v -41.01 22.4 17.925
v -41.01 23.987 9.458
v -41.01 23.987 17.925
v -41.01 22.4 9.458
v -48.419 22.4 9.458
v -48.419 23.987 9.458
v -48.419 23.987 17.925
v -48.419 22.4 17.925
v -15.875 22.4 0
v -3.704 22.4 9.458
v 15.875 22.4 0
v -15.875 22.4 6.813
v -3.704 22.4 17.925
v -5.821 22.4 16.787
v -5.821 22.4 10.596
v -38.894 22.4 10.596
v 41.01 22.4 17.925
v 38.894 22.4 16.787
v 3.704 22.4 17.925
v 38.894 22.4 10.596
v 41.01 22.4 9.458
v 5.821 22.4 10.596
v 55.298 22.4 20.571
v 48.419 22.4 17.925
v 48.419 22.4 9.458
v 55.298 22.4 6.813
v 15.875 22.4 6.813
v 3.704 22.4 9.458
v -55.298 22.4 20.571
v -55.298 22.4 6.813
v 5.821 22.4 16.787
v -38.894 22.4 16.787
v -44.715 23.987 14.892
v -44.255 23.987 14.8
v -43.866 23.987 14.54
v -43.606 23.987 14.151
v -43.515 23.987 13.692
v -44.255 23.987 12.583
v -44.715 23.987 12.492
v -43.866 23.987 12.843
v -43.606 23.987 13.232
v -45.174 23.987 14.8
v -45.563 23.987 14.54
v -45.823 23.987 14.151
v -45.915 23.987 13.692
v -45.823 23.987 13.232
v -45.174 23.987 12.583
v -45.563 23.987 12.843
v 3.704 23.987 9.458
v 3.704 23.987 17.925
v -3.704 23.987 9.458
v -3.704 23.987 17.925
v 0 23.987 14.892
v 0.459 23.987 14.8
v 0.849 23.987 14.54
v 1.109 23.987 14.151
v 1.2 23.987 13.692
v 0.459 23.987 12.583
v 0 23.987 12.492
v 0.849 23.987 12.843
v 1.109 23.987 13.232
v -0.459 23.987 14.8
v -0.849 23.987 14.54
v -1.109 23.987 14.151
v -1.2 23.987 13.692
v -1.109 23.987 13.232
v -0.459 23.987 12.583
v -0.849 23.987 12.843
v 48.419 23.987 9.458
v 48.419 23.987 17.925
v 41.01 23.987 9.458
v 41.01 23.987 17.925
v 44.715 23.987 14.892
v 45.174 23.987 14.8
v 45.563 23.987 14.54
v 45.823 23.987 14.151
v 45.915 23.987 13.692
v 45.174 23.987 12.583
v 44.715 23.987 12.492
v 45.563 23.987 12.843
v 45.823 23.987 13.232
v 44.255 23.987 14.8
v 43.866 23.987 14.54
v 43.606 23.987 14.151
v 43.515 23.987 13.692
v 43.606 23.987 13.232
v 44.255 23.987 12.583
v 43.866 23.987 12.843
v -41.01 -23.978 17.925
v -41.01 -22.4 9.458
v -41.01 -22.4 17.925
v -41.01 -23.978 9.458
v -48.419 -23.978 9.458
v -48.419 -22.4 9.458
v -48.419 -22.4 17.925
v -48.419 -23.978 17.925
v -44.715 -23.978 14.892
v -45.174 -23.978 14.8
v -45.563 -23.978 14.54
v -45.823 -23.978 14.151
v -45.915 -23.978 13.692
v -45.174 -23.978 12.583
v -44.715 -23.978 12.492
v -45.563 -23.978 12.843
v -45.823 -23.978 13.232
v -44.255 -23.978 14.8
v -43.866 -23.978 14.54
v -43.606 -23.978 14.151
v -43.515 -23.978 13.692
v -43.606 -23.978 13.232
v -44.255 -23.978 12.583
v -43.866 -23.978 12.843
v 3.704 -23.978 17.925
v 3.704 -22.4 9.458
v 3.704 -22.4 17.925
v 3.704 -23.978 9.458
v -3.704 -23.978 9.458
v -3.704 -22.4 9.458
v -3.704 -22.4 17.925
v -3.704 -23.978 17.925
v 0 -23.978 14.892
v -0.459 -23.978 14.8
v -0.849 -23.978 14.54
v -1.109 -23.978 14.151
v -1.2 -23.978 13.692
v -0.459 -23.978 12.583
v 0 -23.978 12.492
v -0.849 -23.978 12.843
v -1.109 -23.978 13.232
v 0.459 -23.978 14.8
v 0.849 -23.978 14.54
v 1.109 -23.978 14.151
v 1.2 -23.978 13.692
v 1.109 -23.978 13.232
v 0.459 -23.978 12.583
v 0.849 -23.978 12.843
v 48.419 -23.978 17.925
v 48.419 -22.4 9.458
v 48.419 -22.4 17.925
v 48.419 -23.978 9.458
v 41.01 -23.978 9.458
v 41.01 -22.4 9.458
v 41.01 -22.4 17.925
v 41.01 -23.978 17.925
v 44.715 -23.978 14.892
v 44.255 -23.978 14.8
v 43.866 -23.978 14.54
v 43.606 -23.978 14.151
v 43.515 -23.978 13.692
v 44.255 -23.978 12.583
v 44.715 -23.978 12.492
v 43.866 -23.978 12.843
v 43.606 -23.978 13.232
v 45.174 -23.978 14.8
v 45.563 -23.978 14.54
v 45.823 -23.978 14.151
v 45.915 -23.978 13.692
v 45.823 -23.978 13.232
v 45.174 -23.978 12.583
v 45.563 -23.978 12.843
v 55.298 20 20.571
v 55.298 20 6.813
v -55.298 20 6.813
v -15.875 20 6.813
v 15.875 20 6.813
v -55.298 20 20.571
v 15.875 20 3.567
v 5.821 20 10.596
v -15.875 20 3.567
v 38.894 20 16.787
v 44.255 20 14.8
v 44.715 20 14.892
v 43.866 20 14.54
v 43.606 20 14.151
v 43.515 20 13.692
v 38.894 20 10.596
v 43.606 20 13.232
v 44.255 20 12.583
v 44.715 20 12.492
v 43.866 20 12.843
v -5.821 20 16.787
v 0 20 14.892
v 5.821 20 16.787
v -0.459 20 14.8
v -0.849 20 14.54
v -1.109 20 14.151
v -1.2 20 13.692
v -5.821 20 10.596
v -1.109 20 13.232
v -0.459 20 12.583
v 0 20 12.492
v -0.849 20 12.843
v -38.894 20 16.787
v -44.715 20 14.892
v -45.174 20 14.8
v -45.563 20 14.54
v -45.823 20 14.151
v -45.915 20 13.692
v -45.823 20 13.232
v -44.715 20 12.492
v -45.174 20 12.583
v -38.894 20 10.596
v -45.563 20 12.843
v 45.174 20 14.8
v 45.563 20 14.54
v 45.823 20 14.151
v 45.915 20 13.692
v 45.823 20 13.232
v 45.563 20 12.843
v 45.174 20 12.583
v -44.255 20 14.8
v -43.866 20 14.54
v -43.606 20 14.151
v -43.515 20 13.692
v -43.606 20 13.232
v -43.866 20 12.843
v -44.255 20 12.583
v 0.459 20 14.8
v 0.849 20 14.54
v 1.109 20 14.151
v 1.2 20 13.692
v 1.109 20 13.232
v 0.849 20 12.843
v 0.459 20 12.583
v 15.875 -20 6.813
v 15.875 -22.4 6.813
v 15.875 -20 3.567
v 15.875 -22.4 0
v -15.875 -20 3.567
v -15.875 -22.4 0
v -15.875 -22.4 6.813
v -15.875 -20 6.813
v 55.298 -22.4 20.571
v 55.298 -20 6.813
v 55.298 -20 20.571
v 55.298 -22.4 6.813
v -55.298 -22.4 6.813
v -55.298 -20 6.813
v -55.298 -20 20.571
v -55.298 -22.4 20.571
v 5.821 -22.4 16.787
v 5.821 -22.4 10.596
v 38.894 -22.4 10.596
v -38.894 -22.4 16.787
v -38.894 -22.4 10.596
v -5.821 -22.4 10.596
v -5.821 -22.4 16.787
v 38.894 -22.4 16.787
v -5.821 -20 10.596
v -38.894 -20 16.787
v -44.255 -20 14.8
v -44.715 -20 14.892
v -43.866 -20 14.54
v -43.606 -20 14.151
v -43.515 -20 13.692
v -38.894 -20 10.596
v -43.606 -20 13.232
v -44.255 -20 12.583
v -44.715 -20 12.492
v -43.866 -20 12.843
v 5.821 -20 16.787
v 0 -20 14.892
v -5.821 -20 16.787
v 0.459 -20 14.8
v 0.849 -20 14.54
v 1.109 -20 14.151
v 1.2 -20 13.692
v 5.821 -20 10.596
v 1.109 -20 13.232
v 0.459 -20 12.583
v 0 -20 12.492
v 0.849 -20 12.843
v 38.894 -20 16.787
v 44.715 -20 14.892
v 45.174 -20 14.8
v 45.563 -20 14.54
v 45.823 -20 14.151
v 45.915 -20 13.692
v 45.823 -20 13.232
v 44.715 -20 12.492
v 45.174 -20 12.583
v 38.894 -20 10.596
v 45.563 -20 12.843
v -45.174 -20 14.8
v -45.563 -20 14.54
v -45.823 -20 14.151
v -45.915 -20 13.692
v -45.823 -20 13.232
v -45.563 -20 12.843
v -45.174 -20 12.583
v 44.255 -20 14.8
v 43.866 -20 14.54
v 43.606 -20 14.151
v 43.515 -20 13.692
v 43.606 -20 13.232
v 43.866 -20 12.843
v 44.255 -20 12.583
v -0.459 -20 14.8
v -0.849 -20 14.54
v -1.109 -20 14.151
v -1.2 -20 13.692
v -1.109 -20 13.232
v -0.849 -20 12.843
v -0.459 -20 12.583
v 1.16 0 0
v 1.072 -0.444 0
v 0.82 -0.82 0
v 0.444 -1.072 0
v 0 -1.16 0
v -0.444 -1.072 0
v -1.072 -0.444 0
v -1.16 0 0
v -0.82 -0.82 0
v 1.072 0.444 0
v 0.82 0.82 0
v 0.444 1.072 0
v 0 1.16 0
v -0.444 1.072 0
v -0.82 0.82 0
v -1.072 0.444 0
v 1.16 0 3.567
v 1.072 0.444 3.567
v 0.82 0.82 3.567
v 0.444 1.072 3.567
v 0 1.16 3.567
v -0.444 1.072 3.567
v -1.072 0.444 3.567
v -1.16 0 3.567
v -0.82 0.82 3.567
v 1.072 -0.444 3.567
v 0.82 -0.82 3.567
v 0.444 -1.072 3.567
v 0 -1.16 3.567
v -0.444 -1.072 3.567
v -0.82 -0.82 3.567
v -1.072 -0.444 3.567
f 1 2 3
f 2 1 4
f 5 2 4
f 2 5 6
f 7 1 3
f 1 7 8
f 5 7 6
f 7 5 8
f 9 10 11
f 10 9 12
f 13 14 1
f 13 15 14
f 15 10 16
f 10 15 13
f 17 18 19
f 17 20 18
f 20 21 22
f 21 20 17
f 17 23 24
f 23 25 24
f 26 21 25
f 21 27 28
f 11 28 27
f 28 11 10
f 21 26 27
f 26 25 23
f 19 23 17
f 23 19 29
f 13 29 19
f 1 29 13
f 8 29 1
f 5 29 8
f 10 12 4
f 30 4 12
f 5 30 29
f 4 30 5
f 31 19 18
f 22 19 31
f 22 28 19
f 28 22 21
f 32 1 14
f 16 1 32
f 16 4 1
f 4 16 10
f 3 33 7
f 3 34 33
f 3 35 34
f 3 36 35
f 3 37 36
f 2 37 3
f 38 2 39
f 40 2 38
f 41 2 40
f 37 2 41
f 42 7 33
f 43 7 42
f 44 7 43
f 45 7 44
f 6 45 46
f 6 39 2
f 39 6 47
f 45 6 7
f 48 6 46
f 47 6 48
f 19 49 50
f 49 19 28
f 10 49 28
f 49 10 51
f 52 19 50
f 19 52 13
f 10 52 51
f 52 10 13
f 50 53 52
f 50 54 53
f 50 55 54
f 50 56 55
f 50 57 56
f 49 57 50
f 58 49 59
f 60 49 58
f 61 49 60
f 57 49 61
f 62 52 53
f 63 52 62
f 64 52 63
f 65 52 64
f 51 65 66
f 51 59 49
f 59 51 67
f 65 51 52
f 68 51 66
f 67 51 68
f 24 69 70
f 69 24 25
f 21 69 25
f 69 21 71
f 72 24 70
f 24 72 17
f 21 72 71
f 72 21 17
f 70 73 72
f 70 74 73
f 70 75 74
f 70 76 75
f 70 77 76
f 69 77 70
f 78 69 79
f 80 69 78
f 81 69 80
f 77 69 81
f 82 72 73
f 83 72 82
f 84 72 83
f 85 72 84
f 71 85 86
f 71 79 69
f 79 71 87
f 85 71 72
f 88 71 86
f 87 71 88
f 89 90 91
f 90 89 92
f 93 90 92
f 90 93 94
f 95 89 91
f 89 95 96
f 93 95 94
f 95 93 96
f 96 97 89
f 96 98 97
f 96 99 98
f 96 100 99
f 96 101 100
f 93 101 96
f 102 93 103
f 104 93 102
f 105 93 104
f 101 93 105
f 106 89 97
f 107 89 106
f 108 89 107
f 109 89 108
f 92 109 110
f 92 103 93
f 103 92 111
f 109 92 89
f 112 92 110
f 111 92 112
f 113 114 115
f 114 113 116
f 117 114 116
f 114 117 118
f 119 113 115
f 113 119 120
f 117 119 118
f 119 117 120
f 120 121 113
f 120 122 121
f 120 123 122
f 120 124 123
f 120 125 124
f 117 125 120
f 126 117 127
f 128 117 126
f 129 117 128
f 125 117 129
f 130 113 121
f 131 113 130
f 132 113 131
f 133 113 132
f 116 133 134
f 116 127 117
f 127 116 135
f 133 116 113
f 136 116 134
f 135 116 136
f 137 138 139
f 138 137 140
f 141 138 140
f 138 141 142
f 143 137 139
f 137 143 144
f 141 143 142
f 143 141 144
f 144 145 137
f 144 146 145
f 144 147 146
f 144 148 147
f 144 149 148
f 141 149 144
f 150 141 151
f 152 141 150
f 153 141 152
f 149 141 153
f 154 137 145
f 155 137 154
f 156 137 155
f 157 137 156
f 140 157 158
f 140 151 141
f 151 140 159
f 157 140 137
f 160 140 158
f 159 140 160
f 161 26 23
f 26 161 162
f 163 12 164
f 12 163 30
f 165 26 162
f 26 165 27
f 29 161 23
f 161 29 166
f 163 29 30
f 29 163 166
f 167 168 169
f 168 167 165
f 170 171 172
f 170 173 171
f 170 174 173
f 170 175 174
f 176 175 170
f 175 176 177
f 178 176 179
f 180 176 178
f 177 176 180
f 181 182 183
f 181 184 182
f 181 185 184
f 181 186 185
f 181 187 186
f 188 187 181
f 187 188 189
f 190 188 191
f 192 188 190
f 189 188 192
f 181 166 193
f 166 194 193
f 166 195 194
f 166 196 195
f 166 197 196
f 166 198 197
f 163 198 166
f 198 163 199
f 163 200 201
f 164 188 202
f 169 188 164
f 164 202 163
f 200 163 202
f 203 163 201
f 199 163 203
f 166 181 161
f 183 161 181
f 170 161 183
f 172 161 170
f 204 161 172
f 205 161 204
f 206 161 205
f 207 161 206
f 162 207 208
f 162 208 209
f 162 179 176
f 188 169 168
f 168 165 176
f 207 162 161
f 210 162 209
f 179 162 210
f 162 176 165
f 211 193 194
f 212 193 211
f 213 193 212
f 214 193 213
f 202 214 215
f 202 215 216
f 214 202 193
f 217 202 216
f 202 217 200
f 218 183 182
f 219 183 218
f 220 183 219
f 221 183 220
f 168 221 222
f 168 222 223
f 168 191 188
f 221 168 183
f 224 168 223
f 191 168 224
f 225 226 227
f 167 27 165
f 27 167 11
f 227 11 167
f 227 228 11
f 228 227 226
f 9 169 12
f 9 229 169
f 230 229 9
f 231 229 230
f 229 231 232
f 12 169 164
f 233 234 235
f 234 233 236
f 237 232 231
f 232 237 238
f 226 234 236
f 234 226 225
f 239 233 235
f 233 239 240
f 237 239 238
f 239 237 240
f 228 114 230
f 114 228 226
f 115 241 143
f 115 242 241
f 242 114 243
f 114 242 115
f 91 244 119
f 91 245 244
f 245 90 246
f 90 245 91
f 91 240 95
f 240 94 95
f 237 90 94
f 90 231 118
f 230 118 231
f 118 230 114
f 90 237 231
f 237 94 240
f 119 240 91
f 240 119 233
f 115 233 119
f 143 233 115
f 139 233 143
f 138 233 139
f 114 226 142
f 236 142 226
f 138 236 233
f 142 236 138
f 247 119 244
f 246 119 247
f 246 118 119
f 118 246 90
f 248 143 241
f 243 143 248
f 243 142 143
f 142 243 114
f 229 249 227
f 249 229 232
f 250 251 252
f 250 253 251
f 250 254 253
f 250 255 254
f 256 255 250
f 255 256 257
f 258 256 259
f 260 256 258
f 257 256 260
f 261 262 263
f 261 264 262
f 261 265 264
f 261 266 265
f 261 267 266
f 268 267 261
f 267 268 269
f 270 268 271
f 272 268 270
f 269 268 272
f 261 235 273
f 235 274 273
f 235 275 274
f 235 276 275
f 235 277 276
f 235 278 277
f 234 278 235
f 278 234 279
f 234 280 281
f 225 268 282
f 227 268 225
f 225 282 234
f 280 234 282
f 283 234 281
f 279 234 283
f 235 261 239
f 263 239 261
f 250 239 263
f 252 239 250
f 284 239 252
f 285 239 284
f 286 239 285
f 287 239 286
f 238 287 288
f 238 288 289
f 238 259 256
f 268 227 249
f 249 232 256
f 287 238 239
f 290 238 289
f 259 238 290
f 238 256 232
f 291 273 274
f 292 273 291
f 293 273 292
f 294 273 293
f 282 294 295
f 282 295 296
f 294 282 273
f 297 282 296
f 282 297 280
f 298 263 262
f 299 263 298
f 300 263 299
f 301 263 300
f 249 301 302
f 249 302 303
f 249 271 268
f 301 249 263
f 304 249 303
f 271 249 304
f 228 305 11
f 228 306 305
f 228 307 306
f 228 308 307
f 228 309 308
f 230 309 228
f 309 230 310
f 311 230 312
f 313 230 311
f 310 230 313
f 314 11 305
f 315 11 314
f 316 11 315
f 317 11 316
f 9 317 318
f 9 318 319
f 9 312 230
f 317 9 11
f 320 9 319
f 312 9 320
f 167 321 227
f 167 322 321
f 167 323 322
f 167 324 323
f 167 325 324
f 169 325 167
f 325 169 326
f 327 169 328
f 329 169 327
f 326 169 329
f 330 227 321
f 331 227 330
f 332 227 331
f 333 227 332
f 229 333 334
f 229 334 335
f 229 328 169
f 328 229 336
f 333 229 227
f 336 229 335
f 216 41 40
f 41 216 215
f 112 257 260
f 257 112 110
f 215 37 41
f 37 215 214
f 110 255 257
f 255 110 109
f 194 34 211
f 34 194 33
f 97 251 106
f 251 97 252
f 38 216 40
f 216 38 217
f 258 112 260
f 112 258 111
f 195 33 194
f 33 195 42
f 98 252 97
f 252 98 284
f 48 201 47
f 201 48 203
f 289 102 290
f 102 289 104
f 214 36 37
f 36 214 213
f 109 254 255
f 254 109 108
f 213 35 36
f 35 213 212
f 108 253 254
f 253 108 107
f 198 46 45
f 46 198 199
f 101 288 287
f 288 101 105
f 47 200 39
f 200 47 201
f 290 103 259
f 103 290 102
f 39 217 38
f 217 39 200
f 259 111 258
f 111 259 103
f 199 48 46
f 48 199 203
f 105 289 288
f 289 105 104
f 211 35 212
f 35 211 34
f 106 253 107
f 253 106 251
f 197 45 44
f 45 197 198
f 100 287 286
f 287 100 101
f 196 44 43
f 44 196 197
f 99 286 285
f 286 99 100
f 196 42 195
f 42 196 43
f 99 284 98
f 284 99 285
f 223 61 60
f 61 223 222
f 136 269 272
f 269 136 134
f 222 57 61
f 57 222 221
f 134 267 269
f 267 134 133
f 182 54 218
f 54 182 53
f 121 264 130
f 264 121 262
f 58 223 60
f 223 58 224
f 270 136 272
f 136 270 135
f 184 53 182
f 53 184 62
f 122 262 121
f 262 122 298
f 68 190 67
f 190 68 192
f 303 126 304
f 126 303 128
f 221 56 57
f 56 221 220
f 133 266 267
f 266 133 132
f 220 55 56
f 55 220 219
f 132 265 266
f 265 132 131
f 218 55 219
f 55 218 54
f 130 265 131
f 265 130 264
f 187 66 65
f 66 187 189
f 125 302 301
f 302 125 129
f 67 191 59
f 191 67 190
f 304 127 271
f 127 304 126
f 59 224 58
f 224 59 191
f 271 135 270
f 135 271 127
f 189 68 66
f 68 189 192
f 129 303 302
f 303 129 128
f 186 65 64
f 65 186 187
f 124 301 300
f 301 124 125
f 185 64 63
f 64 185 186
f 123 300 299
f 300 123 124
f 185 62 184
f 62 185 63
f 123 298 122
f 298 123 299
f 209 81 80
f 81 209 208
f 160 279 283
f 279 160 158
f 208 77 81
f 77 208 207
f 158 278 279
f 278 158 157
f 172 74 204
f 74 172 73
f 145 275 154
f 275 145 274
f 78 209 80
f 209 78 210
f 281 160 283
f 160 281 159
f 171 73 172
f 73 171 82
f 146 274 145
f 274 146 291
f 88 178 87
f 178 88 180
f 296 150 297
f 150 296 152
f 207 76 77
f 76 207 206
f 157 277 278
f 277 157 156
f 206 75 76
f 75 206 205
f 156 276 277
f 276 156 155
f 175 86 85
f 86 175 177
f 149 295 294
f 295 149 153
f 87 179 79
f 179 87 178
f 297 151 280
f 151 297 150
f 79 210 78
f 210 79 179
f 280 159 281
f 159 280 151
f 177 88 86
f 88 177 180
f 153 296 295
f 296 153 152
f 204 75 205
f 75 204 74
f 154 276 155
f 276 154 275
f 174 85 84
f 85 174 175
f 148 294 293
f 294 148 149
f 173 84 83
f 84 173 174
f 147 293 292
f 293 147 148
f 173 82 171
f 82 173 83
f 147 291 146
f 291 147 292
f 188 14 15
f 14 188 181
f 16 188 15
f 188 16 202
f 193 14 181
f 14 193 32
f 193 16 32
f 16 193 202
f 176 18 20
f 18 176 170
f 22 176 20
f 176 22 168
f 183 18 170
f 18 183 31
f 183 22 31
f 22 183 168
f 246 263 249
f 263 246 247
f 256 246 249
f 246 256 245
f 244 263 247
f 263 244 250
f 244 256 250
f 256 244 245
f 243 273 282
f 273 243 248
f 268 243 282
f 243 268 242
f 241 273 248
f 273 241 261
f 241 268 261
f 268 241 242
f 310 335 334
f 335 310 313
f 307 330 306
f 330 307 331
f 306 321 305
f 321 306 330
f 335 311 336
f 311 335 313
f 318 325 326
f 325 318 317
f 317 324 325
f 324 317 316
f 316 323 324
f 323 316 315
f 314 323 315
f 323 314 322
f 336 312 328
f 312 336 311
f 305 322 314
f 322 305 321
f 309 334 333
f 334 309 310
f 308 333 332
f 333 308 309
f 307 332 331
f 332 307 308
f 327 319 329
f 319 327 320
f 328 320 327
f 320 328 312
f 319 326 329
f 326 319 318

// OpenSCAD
// file: ../../library/e7_all.scad
// ==========================================================================
//  e7_all.scad - include this one file. Preview, print plates and the report.
// ==========================================================================
include <e7_params.scad>
include <e7_body.scad>

// whole painted loco
module e7_preview() {
  // carbody in its paint bands
  for (i = [0:len(PAINT_BANDS) - 1]) {
    z0 = i == 0 ? -1 : p(PAINT_BANDS[i - 1][0]);
    z1 = i == len(PAINT_BANDS) - 1 ? 1000 : p(PAINT_BANDS[i][0]);
    color(PAINT_BANDS[i][1]) render(convexity = 8) e7_shell_solid([z0, z1]);
  }
  color(C_GLASS) e7_glass();
  color(C_LENS) let (d = nose_d_at_z(HEADLIGHT[0]))
    translate([XF - p(d) + p(HEADLIGHT[2]) + p(1.5), 0, p(HEADLIGHT[0])]) rotate([0, 90, 0]) cylinder(d = p(HEADLIGHT[1]) - 0.8, h = 0.5, $fn = 32);
  color(C_FRAME) { for (j = [1:NFRAME]) e7_frame_piece(j); e7_pilot(); e7_pilot_rear(); }
  for (tx = [TRK_X, -TRK_X]) translate([tx, 0, 0]) { color(C_TRUCK) e7_truck_frame(); color(C_WHEEL) e7_wheels(); }
}
// thin glass panes sitting in the window pockets (preview only)
module e7_glass() {
  intersection() { e7_loft(DET * 0.6); union() { e7_windshield_cut(); e7_side_cuts_windows_only(); } }
}
module e7_side_cuts_windows_only() {
  for (s = [-1, 1], w = CAB_WIN)
    translate([XF - p(w[1]), s * HW - (s > 0 ? DET : 3 - DET), p(w[2])]) cube([p(w[1] - w[0]), 3, p(w[3] - w[2])]);
}

// one print, laid out for the printer
module e7_plate(part) {
  sec = [for (k = [1:NSEC]) str("body_", k)];
  frm = [for (j = [1:NFRAME]) str("frame_", j)];
  if (is_num(search([part], sec)[0])) {
    k = search([part], sec)[0] + 1;
    // stand the section on its open bottom (skirt edge on the bed)
    translate([-sec_x0(k) - SEC_L / 2, 0, -Z_SKIRT]) e7_body_section(k);
  } else if (is_num(search([part], frm)[0])) {
    j = search([part], frm)[0] + 1;
    xs = concat([FRAME_X0], FRAME_SPLITS, [FRAME_X1]);
    translate([-(xs[j - 1] + xs[j]) / 2, 0, -Z_FRAME_BOT]) e7_frame_piece(j);
  } else if (part == "pilot") {
    translate([-XF, 0, 0]) rotate([0, 0, 0]) translate([0, 0, -p(5)]) e7_pilot();
  } else if (part == "pilot_rear") {
    translate([-XR, 0, 0]) translate([0, 0, -(CPL_Z - CPL_H / 2 - WALL)]) e7_pilot_rear();
  } else if (part == "truck") {
    // upside down, bolster on the bed
    translate([0, 0, Z_FRAME_BOT - 0.3]) rotate([180, 0, 0]) e7_truck_frame();
  } else {
    assert(false, str("unknown part '", part, "'"));
  }
}

module e7_report() {
  echo(str("MILW E7A ", ROAD_NO, " class ", CLASS, " - ", SC, " scale 1:", RATIO, ", paint ", PAINT));
  echo(str("  carbody ", round(BL), " mm long, ", round(2 * HW), " mm wide, roof ", round(Z_ROOF), " mm, cab ", round(Z_CAB), " mm above rail"));
  echo(str("  ", NSEC, " body sections of ", round(SEC_L), " mm; ", NFRAME, " frame pieces; trucks at +/- ", round(TRK_X), " mm"));
  echo(str("  body screws ", SCREW_BODY_NAME, " x ", 2 * len(BOSS_X), "; truck pivots ", PIVOT[1], "; wheels ", round(WHEEL_D * 10) / 10, " mm (bought)"));
}
// main file
// Milwaukee Road E7A, O scale 1-48 - print 8 of 8: truck - A1A truck frame (print bolster down; make 2)
// Render (F6), export STL, print. Settings: ../../library/e7_params.scad
// Whole loco preview and notes: ../../MILW_E7_Main.scad
SCALE_SEL = "O";
include <../../library/e7_all.scad>
e7_plate("truck");
